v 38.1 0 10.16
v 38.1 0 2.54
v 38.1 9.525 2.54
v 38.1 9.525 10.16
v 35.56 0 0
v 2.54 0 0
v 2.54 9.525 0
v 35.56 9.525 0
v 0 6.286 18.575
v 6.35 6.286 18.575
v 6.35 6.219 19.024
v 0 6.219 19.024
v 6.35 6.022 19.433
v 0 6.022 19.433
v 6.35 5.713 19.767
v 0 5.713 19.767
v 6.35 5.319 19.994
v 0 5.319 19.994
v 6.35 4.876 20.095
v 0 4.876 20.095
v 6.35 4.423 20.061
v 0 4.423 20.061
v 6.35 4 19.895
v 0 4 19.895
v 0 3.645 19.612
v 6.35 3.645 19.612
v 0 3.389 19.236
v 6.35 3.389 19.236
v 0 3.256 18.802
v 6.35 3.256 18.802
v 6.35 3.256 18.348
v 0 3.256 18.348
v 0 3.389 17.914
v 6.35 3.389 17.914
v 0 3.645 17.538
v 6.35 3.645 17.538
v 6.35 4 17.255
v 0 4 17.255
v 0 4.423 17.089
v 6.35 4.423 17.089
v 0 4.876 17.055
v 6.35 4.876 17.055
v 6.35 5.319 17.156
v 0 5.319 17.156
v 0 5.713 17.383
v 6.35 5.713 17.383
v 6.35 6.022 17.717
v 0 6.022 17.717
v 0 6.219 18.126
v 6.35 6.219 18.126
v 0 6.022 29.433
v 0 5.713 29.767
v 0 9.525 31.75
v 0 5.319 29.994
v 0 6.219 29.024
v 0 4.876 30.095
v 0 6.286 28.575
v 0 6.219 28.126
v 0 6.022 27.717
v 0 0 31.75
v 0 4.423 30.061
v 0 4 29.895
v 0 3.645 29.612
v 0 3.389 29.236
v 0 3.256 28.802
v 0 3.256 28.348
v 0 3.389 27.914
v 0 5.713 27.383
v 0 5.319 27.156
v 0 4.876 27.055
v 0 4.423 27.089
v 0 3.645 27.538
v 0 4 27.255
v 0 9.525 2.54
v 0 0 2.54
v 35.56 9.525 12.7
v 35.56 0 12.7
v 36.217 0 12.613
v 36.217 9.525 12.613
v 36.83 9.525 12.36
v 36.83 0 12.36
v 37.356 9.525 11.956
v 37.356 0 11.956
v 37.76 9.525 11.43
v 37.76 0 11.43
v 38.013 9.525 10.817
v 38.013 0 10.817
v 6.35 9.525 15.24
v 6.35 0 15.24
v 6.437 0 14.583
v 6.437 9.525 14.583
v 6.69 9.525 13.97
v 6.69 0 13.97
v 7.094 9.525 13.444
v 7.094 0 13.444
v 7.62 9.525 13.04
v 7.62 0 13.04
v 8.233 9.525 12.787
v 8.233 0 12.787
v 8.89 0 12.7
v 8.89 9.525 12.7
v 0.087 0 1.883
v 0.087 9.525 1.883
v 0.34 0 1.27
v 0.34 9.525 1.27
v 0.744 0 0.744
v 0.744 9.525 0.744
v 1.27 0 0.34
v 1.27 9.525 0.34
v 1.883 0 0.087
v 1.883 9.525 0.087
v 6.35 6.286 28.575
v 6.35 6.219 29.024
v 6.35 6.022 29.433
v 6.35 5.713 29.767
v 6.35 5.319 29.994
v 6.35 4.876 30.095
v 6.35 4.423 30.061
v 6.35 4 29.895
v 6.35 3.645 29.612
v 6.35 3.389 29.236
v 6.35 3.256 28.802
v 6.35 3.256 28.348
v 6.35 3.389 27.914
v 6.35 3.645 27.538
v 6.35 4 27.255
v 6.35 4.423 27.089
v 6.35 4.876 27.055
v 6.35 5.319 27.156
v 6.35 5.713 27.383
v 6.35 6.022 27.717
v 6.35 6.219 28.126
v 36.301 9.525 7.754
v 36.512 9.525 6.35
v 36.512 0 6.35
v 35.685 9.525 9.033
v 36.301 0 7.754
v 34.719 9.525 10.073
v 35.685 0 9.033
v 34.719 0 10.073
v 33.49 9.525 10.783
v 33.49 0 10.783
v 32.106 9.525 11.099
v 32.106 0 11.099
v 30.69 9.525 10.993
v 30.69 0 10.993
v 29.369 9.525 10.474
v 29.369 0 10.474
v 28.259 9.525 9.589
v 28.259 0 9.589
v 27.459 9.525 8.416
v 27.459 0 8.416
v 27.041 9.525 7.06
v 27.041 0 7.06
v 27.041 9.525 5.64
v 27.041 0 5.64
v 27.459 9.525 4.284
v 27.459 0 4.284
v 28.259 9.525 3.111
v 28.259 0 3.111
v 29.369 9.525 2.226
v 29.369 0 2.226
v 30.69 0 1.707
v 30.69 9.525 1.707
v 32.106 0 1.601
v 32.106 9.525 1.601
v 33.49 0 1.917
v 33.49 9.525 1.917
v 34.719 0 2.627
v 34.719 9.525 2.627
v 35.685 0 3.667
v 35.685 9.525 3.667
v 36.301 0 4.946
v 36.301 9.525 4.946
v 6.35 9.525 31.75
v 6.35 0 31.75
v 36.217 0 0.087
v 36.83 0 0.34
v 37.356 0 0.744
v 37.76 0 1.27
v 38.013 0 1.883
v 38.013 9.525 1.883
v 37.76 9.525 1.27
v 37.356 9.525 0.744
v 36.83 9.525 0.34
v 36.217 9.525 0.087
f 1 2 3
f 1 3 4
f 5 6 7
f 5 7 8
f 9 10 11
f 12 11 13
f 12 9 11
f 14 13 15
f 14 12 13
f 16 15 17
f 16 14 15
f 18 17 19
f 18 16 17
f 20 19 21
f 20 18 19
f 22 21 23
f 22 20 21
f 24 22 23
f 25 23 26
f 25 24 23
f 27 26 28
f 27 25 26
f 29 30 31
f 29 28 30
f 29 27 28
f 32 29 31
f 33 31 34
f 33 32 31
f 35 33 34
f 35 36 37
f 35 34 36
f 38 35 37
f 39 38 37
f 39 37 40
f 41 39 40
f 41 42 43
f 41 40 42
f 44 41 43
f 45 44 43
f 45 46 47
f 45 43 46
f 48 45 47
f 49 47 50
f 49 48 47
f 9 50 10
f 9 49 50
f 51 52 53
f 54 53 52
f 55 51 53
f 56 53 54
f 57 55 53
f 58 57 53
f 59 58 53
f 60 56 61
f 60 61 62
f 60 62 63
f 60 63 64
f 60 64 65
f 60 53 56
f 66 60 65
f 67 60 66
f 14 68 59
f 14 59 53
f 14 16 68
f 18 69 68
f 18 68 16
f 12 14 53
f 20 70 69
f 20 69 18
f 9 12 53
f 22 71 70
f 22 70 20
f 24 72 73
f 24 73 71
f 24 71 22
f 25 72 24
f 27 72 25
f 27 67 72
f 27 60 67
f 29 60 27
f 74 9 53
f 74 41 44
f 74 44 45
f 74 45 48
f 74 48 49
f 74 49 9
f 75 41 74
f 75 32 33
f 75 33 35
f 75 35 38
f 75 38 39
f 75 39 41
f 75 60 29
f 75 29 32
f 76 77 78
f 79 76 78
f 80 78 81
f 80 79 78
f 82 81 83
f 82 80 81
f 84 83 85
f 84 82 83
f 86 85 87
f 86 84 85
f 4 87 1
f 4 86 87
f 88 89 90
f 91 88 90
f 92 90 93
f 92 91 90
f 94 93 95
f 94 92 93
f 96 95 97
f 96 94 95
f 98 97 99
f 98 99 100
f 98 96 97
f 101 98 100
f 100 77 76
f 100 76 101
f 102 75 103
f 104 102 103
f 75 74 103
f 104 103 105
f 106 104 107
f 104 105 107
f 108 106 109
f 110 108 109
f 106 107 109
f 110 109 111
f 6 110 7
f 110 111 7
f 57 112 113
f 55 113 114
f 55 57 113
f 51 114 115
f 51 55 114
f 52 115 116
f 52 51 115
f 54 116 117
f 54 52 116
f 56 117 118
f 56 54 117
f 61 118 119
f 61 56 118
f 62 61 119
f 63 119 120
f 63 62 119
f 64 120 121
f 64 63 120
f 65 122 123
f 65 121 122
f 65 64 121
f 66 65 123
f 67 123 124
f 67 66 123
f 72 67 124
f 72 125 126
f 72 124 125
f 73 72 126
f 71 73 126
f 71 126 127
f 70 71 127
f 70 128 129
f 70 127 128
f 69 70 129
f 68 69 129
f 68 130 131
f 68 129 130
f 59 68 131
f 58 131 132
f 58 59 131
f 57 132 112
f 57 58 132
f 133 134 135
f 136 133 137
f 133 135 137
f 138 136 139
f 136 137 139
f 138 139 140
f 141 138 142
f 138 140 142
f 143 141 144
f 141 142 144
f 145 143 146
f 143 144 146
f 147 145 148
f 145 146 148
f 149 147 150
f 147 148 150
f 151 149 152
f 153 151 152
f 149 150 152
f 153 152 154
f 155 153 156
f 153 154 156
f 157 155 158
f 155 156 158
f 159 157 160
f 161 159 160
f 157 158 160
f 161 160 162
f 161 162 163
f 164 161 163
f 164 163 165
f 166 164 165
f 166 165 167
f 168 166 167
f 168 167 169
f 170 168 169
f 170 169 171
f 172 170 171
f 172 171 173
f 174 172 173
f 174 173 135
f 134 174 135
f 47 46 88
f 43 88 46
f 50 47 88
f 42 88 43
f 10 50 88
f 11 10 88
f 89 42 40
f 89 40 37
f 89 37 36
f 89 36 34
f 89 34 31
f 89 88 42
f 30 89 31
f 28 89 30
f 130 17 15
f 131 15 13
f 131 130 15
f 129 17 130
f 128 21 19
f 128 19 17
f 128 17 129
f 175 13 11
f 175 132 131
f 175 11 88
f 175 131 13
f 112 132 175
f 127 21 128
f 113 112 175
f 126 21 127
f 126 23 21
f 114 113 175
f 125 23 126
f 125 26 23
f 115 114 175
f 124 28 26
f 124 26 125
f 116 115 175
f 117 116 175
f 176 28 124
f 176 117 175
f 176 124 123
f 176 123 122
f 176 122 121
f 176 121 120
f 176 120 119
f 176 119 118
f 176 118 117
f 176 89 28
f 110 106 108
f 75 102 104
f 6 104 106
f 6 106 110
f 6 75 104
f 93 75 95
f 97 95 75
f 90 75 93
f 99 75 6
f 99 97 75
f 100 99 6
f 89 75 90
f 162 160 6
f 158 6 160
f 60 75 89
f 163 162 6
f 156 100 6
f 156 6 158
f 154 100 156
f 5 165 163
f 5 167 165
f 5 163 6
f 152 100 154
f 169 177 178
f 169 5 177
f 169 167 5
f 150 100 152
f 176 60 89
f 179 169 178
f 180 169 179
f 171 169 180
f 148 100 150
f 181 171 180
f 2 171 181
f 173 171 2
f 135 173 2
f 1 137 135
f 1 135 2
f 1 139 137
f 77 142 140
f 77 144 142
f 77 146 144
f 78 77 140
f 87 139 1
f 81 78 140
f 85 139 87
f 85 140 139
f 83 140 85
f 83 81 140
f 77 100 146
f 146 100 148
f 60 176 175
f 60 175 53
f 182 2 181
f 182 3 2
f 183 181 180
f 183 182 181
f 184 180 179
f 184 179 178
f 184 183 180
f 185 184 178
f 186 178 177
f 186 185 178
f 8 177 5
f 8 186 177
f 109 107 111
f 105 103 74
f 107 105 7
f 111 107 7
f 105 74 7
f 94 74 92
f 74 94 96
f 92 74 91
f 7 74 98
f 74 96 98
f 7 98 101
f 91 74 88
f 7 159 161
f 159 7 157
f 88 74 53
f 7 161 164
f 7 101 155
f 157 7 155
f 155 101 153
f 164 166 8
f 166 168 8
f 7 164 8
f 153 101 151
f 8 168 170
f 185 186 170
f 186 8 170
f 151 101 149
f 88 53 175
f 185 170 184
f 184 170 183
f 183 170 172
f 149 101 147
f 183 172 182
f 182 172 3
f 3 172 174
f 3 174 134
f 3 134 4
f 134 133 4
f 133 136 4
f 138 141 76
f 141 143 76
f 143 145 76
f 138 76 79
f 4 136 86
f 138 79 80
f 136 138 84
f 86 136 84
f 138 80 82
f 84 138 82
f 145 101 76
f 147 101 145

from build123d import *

# Parameters (mm, degrees)
F1_DEPTH = 9.525
F2_R     = 4.7625
F3_DEPTH = 9.526
F4_R     = 1.524
F5_DEPTH = 25.4
F6_R     = 2.54


with BuildPart() as f1:
    # F0 (on Front) → F1 (new body)
    with BuildSketch(Plane.XZ):
        Polygon((6.35, 12.7), (6.35, 31.75), (0, 31.75), (0, 0), (38.1, 0), (38.1, 12.7), align=None)
    extrude(amount=-F1_DEPTH)

    # F2 (on Front) → F3 (cut, through all)
    with BuildSketch(Plane.XZ):
        with Locations((31.75, 6.35)):
            Circle(F2_R)
    extrude(amount=-F3_DEPTH, mode=Mode.SUBTRACT)

    # F4 (on Right) → F5 (cut)
    with BuildSketch(Plane.YZ):
        with Locations((4.7625, 28.575)):
            Circle(F4_R)
        with Locations((4.7625, 18.575)):
            Circle(F4_R)
    extrude(amount=F5_DEPTH, mode=Mode.SUBTRACT)

    # F6
    f6_edges = [f1.edges().sort_by_distance(p)[0] for p in [
        (0, 4.7625, 0),
        (38.1, 4.7625, 0),
        (38.1, 4.7625, 12.7),
        (6.35, 4.7625, 12.7),
    ]]
    fillet(f6_edges, radius=F6_R)


solid = f1.part
